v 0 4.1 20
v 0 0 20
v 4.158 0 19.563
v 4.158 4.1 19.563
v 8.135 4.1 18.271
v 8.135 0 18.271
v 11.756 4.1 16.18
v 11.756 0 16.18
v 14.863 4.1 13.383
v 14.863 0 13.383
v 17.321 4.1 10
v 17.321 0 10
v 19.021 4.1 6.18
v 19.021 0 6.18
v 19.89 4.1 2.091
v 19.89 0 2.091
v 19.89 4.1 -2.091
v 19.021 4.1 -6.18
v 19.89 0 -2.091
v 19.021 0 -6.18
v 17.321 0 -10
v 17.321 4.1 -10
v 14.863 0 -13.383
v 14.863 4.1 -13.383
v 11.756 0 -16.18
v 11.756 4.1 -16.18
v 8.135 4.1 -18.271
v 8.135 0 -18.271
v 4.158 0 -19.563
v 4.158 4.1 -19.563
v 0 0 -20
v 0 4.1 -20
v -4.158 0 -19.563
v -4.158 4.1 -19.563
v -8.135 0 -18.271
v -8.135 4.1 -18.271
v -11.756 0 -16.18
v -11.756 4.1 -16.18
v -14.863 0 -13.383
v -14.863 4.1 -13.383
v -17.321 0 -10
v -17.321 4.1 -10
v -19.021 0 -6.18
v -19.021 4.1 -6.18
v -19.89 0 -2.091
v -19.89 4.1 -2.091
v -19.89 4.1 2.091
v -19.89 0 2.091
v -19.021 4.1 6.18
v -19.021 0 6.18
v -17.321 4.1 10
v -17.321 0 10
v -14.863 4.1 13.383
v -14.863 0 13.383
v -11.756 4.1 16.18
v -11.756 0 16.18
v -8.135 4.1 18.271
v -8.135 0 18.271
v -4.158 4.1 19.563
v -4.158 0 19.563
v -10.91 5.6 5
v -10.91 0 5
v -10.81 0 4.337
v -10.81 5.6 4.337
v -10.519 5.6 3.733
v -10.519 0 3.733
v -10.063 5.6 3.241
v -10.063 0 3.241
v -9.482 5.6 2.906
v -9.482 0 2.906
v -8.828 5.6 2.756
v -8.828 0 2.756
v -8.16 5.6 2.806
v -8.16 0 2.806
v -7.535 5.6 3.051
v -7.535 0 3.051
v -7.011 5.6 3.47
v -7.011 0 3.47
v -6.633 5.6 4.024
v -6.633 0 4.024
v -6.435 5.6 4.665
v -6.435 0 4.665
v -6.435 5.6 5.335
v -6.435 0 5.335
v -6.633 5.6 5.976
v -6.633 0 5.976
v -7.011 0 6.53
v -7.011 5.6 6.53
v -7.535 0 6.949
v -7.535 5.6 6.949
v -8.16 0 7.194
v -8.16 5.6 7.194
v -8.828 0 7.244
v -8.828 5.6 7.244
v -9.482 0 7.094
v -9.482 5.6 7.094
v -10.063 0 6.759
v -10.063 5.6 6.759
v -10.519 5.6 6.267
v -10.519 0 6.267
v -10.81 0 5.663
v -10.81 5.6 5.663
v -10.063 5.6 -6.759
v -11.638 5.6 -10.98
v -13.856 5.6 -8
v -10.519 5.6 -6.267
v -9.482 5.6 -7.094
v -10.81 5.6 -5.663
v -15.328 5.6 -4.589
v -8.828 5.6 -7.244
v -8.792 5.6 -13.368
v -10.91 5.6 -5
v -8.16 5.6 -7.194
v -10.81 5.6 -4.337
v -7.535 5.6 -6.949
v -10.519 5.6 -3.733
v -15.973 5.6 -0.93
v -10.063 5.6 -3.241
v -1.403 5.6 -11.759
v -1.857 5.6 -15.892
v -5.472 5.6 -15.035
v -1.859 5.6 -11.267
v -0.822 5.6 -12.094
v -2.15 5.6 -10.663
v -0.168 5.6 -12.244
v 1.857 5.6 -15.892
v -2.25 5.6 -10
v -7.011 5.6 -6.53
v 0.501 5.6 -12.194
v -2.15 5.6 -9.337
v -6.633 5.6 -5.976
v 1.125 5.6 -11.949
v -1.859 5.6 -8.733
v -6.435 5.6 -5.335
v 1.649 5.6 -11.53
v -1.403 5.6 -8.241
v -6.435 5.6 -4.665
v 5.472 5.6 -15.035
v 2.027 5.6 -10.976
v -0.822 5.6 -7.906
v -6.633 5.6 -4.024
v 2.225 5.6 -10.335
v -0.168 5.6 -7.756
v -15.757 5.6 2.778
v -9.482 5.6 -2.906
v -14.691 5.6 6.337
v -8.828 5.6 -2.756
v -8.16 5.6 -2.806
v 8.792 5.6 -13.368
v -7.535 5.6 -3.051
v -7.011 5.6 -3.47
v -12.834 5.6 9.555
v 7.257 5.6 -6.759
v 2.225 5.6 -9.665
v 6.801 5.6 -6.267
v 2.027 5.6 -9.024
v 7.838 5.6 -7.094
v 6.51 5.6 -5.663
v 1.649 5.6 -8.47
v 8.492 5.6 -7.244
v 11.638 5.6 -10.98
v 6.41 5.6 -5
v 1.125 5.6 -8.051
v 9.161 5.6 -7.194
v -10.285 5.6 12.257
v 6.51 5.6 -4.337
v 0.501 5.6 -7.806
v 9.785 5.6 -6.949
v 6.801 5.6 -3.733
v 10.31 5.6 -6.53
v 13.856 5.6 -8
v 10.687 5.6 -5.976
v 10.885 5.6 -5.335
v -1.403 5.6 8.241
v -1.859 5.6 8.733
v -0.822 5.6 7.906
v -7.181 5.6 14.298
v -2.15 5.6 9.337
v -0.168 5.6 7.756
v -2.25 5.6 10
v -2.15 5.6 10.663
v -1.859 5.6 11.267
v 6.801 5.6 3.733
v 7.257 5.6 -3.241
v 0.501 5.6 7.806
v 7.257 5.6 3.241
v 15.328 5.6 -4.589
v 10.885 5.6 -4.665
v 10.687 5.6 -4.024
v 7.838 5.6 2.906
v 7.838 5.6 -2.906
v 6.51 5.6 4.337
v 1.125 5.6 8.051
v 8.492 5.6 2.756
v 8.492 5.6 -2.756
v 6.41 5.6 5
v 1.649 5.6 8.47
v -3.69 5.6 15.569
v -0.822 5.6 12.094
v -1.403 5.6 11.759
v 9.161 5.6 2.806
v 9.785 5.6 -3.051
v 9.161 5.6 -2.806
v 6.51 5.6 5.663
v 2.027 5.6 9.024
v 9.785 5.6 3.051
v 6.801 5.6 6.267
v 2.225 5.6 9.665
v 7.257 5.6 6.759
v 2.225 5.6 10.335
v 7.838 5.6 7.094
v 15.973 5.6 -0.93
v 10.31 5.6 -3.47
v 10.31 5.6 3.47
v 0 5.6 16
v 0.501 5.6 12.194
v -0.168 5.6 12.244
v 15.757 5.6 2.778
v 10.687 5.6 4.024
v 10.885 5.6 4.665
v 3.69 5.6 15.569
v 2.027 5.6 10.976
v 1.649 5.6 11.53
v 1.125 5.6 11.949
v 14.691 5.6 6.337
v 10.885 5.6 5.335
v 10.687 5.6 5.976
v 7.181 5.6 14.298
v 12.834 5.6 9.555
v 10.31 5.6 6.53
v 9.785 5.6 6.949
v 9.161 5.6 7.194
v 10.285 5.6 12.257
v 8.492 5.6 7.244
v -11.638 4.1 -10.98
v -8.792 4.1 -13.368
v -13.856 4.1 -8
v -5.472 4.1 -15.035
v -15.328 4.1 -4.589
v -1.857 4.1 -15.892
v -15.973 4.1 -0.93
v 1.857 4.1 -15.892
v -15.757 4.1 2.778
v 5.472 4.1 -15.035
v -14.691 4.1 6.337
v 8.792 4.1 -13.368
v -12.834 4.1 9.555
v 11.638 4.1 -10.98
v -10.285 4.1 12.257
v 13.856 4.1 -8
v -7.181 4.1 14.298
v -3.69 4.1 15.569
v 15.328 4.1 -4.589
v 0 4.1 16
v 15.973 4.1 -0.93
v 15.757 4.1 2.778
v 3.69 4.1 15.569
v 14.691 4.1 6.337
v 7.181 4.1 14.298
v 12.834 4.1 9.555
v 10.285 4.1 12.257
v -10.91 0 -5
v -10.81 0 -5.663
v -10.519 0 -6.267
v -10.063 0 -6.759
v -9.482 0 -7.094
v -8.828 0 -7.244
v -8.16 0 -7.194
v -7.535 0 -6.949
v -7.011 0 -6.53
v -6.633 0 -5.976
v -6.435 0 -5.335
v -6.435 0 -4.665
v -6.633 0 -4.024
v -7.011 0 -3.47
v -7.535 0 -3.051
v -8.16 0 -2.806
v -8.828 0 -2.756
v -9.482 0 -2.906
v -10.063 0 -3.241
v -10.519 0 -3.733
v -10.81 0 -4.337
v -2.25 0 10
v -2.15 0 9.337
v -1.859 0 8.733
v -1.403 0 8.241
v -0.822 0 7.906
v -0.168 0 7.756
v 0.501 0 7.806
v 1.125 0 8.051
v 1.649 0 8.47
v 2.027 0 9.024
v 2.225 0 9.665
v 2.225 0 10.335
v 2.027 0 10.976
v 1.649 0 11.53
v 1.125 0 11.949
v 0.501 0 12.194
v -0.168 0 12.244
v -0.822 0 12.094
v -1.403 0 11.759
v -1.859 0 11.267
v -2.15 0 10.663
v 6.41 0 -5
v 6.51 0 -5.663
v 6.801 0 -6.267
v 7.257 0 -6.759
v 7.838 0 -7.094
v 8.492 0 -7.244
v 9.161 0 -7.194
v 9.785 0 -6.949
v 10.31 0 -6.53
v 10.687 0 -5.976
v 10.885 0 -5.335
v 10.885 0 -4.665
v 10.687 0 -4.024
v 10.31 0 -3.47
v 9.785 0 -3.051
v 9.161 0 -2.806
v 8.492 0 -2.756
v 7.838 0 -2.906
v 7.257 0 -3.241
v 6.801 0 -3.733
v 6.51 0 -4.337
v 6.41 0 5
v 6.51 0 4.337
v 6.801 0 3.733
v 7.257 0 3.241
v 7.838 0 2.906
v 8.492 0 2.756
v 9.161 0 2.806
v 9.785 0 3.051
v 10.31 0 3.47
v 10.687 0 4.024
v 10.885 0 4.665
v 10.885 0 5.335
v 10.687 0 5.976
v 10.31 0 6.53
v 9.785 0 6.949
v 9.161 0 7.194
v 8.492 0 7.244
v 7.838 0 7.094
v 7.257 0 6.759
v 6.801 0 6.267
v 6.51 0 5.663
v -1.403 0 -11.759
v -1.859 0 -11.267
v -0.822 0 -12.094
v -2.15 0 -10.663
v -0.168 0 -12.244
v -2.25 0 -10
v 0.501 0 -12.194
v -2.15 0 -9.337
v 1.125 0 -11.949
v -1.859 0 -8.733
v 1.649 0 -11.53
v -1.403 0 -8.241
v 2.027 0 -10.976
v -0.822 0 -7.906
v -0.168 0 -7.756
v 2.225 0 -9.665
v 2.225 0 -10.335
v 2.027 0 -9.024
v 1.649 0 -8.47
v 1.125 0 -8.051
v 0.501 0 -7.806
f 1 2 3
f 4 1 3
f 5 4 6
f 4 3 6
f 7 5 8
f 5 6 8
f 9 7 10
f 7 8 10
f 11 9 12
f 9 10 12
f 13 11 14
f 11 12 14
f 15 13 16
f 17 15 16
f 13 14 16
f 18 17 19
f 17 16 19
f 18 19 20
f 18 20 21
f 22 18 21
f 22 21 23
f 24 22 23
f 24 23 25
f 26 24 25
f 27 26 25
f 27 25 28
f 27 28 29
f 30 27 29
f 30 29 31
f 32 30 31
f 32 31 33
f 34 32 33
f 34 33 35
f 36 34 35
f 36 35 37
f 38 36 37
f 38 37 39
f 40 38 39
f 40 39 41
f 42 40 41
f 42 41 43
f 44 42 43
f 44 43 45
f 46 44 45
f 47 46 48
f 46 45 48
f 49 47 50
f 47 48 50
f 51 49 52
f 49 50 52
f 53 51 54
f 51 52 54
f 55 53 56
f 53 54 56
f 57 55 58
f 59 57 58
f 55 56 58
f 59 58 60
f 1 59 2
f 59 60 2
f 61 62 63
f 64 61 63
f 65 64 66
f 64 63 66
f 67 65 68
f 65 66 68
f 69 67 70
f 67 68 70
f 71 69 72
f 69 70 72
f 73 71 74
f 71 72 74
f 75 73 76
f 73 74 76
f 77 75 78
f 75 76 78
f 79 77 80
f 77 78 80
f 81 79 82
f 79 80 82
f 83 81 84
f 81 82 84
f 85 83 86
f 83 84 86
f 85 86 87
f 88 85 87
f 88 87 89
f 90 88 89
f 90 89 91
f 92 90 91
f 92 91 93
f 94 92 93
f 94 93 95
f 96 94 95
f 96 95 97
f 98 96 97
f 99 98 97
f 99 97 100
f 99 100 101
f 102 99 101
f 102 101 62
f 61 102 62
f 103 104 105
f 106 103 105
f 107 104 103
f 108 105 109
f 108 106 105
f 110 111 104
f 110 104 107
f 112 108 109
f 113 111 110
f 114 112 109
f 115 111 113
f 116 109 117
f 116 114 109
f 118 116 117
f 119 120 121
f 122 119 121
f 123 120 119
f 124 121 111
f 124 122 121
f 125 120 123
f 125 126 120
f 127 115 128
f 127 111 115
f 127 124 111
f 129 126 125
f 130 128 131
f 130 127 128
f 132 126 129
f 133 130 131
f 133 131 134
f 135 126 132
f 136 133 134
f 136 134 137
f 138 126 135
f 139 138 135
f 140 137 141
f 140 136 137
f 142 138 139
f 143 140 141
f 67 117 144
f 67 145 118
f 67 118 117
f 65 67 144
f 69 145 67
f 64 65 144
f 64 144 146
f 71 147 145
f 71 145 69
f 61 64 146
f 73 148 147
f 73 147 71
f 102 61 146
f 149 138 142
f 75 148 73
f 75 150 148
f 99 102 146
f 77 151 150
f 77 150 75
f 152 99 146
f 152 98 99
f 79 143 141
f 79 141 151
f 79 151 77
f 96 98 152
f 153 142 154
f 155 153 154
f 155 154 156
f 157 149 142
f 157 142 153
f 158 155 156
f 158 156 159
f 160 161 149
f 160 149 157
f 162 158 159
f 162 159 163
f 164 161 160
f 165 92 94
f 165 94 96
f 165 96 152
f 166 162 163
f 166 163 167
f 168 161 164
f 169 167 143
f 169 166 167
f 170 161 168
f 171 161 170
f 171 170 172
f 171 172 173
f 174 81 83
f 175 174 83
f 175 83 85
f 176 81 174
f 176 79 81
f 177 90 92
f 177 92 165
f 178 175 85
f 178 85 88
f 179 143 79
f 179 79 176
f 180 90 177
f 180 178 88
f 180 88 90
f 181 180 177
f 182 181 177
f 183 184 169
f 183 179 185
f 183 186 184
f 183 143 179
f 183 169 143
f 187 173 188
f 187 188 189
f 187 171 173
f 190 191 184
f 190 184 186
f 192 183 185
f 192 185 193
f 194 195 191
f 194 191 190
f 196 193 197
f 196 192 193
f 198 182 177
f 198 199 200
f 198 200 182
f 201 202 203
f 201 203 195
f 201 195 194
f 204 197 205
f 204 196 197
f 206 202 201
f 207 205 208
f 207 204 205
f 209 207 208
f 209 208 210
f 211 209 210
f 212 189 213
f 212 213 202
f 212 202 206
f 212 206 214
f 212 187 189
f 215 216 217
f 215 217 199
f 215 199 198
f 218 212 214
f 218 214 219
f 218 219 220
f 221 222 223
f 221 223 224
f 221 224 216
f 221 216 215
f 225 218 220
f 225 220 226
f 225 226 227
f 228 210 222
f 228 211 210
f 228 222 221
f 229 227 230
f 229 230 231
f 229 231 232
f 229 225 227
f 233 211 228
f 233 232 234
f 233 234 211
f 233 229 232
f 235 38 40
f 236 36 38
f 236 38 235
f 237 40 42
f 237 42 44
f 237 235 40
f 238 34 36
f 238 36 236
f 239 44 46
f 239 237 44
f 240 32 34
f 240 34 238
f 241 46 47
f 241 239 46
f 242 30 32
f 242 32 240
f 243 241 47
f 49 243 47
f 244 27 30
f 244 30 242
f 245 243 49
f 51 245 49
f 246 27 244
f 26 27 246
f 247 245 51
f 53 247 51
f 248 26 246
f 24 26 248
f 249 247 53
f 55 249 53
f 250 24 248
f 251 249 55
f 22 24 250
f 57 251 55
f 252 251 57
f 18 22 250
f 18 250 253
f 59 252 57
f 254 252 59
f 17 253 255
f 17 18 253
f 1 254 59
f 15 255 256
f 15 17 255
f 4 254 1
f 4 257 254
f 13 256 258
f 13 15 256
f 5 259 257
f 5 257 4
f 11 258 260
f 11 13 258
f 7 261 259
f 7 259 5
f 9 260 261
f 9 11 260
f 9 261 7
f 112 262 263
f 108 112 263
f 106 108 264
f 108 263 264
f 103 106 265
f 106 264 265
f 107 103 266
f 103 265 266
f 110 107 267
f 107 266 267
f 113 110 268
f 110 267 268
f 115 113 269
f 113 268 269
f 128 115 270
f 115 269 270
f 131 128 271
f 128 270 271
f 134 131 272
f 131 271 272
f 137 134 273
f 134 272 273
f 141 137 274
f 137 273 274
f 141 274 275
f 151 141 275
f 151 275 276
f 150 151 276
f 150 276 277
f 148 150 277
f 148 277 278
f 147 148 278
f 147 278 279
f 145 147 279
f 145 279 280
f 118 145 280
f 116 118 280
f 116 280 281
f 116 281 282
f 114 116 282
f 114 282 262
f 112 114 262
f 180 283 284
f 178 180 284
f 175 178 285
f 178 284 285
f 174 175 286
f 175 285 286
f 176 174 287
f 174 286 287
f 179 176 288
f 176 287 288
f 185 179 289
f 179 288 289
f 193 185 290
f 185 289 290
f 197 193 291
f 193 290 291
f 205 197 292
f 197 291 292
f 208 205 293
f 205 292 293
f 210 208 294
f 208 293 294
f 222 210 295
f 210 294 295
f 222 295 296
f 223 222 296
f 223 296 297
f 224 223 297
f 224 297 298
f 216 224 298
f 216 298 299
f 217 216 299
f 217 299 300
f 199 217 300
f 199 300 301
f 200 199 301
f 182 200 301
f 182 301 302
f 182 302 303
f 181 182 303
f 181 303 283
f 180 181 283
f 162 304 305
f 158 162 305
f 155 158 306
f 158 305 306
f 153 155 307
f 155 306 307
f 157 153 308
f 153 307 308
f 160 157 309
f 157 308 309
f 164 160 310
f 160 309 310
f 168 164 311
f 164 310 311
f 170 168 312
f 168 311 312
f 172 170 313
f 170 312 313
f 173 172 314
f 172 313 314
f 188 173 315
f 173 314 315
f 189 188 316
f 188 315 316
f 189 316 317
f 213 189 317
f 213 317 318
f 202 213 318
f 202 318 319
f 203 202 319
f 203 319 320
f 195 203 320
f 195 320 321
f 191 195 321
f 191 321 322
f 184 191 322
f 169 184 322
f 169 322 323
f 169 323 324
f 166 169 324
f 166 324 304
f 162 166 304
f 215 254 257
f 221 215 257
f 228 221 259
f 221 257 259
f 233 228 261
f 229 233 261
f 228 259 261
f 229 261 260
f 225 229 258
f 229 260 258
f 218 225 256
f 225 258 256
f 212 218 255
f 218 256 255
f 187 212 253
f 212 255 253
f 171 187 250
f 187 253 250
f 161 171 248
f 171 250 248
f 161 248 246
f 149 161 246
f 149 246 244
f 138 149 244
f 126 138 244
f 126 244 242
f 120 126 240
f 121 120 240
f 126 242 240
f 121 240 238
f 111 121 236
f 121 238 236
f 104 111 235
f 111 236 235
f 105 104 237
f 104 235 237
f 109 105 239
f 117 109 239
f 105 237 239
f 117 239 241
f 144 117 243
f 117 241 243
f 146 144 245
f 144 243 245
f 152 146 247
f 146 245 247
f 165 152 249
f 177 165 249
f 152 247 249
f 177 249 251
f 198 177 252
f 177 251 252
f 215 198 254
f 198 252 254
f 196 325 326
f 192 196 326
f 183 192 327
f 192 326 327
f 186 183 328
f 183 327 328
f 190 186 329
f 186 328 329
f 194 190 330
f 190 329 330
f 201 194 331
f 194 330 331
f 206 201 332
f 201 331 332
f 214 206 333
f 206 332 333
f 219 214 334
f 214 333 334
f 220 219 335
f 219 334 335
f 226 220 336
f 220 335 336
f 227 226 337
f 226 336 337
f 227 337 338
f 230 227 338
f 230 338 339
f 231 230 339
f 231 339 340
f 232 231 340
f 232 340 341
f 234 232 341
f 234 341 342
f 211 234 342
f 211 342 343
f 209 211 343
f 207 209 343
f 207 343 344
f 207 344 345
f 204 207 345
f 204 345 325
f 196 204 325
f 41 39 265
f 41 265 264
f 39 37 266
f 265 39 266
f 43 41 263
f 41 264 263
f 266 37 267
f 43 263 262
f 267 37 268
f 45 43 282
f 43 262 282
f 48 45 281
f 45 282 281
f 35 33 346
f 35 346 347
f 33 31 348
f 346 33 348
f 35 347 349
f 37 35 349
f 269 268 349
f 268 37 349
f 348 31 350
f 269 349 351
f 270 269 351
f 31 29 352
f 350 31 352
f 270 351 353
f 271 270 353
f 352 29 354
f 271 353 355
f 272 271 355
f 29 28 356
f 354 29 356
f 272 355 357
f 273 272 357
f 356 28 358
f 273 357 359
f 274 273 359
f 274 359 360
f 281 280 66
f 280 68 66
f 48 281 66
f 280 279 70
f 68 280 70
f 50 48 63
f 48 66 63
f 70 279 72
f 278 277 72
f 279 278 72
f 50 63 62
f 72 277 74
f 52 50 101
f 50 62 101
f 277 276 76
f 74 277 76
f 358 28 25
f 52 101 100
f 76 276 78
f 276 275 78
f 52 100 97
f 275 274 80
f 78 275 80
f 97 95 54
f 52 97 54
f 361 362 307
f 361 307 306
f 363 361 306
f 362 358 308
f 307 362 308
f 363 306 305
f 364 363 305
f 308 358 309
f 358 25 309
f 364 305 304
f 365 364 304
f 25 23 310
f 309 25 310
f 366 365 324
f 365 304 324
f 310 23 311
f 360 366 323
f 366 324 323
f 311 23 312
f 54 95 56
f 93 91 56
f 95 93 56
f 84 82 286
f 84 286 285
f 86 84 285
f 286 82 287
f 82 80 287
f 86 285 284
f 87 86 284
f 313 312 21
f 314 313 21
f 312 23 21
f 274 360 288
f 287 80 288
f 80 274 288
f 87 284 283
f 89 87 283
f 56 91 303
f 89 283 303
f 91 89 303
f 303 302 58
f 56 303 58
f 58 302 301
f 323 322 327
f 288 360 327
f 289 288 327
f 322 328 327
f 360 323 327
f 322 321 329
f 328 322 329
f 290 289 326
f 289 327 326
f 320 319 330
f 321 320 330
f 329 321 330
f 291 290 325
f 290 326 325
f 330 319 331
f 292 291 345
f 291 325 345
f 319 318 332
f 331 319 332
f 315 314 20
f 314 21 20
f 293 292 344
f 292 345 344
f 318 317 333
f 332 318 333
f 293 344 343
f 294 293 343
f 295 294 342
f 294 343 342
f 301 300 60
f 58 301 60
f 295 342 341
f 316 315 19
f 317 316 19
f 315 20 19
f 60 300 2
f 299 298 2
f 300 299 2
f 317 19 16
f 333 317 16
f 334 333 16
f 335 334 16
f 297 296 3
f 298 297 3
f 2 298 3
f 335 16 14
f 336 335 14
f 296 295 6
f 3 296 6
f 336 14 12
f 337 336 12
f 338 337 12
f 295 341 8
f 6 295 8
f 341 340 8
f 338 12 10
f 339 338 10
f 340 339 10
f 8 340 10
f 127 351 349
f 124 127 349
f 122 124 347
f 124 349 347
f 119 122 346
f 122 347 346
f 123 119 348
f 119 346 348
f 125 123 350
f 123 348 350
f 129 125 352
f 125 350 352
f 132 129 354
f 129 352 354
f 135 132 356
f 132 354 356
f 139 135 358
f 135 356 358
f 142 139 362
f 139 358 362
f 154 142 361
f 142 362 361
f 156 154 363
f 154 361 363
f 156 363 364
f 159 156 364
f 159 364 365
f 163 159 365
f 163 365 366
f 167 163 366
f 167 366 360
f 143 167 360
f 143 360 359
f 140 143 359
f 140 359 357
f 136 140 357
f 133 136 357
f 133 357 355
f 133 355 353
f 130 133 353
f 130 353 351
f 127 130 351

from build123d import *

# Parameters (mm, degrees)
SKIZZE1_R                       = 20
AUFSATZ_LINEAR_AUSTRAGEN1_DEPTH = 5.6
SCHNITT_LINEAR_START            = -1.5
SKIZZE2_R                       = 20
SKIZZE2_R_2                     = 16
SCHNITT_LINEAR_AUSTRAGEN1_DEPTH = 1.5
DURCHGANGSLOCH_F_R_M41_D        = 4.5


with BuildPart() as part:
    # Skizze1 → Aufsatz-Linear austragen1 (new body)
    with BuildSketch(Plane(origin=(0, 0, 0), x_dir=(1, 0, 0), z_dir=(0, 1, 0))):
        with Locations(Location((0, 0, 0), (0, 0, 270))):
            Circle(SKIZZE1_R)
    extrude(amount=AUFSATZ_LINEAR_AUSTRAGEN1_DEPTH)

    # Skizze2 → Schnitt-Linear austragen1 (cut)
    with BuildSketch(Plane(origin=(0, 5.6, 0), x_dir=(1, 0, 0), z_dir=(0, 1, 0)).offset(SCHNITT_LINEAR_START)):
        with Locations(Location((0, 0, 0), (0, 0, 270))):
            Circle(SKIZZE2_R)
        with Locations(Location((0, 0, 0), (0, 0, 270))):
            Circle(SKIZZE2_R_2, mode=Mode.SUBTRACT)
    extrude(amount=SCHNITT_LINEAR_AUSTRAGEN1_DEPTH, mode=Mode.SUBTRACT)

    # Durchgangsloch für M41 (through all)
    with Locations(Plane(origin=(0, 5.6, 0), x_dir=(1, 0, 0), z_dir=(0, 1, 0))):
        with Locations((0, 10), (8.660254038, 5), (8.660254038, -5), (0, -10), (-8.660254038, -5), (-8.660254038, 5)):
            Hole(DURCHGANGSLOCH_F_R_M41_D / 2)


solid = part.part
